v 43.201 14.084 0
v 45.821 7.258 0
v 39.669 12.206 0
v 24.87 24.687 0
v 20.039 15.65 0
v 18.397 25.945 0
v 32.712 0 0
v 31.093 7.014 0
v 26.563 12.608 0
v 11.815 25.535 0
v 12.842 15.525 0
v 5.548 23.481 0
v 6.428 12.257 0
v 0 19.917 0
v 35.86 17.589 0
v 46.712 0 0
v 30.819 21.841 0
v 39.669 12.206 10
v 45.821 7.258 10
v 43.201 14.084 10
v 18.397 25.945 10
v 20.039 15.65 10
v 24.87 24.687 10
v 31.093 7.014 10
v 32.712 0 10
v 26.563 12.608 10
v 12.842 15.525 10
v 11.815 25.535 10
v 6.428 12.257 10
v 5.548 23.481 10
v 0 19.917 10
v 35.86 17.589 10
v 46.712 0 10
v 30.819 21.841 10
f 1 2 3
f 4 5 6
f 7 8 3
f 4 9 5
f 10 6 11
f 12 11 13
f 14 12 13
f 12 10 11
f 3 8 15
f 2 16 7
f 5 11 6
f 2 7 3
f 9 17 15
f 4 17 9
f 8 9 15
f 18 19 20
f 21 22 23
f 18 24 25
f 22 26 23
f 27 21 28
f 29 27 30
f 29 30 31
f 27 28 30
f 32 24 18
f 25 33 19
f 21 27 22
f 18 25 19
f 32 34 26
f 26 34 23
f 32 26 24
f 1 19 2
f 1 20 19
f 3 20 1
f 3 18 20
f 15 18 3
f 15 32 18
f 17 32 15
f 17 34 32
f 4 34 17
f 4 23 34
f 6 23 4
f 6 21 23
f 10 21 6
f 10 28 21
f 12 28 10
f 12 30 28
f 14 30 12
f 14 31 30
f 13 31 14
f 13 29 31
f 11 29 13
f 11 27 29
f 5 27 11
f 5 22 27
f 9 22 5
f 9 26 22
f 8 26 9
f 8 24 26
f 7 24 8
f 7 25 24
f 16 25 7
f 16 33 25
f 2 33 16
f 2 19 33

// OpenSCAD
$fn = 32;

// ----------------------------------------------------------------------
// Arc stop: segment, 10 mm thick
// ----------------------------------------------------------------------

// --- parameters (mm) ---
profile_height = 10;      // extrusion height
profile_points = 17;      // points of the closed outline

profile = [[46.712, 0], [45.821, 7.258], [43.201, 14.084], [39.669, 12.206], [35.86, 17.589], [30.819, 21.841], [24.87, 24.687], [18.397, 25.945], [11.815, 25.535], [5.548, 23.481], [0, 19.917], [6.428, 12.257], [12.842, 15.525], [20.039, 15.65], [26.563, 12.608], [31.093, 7.014], [32.712, 0]];  // single closed polygon, 17 points, counter clockwise

// --- the one profile operation ---
linear_extrude(height = profile_height) polygon(points = profile);
